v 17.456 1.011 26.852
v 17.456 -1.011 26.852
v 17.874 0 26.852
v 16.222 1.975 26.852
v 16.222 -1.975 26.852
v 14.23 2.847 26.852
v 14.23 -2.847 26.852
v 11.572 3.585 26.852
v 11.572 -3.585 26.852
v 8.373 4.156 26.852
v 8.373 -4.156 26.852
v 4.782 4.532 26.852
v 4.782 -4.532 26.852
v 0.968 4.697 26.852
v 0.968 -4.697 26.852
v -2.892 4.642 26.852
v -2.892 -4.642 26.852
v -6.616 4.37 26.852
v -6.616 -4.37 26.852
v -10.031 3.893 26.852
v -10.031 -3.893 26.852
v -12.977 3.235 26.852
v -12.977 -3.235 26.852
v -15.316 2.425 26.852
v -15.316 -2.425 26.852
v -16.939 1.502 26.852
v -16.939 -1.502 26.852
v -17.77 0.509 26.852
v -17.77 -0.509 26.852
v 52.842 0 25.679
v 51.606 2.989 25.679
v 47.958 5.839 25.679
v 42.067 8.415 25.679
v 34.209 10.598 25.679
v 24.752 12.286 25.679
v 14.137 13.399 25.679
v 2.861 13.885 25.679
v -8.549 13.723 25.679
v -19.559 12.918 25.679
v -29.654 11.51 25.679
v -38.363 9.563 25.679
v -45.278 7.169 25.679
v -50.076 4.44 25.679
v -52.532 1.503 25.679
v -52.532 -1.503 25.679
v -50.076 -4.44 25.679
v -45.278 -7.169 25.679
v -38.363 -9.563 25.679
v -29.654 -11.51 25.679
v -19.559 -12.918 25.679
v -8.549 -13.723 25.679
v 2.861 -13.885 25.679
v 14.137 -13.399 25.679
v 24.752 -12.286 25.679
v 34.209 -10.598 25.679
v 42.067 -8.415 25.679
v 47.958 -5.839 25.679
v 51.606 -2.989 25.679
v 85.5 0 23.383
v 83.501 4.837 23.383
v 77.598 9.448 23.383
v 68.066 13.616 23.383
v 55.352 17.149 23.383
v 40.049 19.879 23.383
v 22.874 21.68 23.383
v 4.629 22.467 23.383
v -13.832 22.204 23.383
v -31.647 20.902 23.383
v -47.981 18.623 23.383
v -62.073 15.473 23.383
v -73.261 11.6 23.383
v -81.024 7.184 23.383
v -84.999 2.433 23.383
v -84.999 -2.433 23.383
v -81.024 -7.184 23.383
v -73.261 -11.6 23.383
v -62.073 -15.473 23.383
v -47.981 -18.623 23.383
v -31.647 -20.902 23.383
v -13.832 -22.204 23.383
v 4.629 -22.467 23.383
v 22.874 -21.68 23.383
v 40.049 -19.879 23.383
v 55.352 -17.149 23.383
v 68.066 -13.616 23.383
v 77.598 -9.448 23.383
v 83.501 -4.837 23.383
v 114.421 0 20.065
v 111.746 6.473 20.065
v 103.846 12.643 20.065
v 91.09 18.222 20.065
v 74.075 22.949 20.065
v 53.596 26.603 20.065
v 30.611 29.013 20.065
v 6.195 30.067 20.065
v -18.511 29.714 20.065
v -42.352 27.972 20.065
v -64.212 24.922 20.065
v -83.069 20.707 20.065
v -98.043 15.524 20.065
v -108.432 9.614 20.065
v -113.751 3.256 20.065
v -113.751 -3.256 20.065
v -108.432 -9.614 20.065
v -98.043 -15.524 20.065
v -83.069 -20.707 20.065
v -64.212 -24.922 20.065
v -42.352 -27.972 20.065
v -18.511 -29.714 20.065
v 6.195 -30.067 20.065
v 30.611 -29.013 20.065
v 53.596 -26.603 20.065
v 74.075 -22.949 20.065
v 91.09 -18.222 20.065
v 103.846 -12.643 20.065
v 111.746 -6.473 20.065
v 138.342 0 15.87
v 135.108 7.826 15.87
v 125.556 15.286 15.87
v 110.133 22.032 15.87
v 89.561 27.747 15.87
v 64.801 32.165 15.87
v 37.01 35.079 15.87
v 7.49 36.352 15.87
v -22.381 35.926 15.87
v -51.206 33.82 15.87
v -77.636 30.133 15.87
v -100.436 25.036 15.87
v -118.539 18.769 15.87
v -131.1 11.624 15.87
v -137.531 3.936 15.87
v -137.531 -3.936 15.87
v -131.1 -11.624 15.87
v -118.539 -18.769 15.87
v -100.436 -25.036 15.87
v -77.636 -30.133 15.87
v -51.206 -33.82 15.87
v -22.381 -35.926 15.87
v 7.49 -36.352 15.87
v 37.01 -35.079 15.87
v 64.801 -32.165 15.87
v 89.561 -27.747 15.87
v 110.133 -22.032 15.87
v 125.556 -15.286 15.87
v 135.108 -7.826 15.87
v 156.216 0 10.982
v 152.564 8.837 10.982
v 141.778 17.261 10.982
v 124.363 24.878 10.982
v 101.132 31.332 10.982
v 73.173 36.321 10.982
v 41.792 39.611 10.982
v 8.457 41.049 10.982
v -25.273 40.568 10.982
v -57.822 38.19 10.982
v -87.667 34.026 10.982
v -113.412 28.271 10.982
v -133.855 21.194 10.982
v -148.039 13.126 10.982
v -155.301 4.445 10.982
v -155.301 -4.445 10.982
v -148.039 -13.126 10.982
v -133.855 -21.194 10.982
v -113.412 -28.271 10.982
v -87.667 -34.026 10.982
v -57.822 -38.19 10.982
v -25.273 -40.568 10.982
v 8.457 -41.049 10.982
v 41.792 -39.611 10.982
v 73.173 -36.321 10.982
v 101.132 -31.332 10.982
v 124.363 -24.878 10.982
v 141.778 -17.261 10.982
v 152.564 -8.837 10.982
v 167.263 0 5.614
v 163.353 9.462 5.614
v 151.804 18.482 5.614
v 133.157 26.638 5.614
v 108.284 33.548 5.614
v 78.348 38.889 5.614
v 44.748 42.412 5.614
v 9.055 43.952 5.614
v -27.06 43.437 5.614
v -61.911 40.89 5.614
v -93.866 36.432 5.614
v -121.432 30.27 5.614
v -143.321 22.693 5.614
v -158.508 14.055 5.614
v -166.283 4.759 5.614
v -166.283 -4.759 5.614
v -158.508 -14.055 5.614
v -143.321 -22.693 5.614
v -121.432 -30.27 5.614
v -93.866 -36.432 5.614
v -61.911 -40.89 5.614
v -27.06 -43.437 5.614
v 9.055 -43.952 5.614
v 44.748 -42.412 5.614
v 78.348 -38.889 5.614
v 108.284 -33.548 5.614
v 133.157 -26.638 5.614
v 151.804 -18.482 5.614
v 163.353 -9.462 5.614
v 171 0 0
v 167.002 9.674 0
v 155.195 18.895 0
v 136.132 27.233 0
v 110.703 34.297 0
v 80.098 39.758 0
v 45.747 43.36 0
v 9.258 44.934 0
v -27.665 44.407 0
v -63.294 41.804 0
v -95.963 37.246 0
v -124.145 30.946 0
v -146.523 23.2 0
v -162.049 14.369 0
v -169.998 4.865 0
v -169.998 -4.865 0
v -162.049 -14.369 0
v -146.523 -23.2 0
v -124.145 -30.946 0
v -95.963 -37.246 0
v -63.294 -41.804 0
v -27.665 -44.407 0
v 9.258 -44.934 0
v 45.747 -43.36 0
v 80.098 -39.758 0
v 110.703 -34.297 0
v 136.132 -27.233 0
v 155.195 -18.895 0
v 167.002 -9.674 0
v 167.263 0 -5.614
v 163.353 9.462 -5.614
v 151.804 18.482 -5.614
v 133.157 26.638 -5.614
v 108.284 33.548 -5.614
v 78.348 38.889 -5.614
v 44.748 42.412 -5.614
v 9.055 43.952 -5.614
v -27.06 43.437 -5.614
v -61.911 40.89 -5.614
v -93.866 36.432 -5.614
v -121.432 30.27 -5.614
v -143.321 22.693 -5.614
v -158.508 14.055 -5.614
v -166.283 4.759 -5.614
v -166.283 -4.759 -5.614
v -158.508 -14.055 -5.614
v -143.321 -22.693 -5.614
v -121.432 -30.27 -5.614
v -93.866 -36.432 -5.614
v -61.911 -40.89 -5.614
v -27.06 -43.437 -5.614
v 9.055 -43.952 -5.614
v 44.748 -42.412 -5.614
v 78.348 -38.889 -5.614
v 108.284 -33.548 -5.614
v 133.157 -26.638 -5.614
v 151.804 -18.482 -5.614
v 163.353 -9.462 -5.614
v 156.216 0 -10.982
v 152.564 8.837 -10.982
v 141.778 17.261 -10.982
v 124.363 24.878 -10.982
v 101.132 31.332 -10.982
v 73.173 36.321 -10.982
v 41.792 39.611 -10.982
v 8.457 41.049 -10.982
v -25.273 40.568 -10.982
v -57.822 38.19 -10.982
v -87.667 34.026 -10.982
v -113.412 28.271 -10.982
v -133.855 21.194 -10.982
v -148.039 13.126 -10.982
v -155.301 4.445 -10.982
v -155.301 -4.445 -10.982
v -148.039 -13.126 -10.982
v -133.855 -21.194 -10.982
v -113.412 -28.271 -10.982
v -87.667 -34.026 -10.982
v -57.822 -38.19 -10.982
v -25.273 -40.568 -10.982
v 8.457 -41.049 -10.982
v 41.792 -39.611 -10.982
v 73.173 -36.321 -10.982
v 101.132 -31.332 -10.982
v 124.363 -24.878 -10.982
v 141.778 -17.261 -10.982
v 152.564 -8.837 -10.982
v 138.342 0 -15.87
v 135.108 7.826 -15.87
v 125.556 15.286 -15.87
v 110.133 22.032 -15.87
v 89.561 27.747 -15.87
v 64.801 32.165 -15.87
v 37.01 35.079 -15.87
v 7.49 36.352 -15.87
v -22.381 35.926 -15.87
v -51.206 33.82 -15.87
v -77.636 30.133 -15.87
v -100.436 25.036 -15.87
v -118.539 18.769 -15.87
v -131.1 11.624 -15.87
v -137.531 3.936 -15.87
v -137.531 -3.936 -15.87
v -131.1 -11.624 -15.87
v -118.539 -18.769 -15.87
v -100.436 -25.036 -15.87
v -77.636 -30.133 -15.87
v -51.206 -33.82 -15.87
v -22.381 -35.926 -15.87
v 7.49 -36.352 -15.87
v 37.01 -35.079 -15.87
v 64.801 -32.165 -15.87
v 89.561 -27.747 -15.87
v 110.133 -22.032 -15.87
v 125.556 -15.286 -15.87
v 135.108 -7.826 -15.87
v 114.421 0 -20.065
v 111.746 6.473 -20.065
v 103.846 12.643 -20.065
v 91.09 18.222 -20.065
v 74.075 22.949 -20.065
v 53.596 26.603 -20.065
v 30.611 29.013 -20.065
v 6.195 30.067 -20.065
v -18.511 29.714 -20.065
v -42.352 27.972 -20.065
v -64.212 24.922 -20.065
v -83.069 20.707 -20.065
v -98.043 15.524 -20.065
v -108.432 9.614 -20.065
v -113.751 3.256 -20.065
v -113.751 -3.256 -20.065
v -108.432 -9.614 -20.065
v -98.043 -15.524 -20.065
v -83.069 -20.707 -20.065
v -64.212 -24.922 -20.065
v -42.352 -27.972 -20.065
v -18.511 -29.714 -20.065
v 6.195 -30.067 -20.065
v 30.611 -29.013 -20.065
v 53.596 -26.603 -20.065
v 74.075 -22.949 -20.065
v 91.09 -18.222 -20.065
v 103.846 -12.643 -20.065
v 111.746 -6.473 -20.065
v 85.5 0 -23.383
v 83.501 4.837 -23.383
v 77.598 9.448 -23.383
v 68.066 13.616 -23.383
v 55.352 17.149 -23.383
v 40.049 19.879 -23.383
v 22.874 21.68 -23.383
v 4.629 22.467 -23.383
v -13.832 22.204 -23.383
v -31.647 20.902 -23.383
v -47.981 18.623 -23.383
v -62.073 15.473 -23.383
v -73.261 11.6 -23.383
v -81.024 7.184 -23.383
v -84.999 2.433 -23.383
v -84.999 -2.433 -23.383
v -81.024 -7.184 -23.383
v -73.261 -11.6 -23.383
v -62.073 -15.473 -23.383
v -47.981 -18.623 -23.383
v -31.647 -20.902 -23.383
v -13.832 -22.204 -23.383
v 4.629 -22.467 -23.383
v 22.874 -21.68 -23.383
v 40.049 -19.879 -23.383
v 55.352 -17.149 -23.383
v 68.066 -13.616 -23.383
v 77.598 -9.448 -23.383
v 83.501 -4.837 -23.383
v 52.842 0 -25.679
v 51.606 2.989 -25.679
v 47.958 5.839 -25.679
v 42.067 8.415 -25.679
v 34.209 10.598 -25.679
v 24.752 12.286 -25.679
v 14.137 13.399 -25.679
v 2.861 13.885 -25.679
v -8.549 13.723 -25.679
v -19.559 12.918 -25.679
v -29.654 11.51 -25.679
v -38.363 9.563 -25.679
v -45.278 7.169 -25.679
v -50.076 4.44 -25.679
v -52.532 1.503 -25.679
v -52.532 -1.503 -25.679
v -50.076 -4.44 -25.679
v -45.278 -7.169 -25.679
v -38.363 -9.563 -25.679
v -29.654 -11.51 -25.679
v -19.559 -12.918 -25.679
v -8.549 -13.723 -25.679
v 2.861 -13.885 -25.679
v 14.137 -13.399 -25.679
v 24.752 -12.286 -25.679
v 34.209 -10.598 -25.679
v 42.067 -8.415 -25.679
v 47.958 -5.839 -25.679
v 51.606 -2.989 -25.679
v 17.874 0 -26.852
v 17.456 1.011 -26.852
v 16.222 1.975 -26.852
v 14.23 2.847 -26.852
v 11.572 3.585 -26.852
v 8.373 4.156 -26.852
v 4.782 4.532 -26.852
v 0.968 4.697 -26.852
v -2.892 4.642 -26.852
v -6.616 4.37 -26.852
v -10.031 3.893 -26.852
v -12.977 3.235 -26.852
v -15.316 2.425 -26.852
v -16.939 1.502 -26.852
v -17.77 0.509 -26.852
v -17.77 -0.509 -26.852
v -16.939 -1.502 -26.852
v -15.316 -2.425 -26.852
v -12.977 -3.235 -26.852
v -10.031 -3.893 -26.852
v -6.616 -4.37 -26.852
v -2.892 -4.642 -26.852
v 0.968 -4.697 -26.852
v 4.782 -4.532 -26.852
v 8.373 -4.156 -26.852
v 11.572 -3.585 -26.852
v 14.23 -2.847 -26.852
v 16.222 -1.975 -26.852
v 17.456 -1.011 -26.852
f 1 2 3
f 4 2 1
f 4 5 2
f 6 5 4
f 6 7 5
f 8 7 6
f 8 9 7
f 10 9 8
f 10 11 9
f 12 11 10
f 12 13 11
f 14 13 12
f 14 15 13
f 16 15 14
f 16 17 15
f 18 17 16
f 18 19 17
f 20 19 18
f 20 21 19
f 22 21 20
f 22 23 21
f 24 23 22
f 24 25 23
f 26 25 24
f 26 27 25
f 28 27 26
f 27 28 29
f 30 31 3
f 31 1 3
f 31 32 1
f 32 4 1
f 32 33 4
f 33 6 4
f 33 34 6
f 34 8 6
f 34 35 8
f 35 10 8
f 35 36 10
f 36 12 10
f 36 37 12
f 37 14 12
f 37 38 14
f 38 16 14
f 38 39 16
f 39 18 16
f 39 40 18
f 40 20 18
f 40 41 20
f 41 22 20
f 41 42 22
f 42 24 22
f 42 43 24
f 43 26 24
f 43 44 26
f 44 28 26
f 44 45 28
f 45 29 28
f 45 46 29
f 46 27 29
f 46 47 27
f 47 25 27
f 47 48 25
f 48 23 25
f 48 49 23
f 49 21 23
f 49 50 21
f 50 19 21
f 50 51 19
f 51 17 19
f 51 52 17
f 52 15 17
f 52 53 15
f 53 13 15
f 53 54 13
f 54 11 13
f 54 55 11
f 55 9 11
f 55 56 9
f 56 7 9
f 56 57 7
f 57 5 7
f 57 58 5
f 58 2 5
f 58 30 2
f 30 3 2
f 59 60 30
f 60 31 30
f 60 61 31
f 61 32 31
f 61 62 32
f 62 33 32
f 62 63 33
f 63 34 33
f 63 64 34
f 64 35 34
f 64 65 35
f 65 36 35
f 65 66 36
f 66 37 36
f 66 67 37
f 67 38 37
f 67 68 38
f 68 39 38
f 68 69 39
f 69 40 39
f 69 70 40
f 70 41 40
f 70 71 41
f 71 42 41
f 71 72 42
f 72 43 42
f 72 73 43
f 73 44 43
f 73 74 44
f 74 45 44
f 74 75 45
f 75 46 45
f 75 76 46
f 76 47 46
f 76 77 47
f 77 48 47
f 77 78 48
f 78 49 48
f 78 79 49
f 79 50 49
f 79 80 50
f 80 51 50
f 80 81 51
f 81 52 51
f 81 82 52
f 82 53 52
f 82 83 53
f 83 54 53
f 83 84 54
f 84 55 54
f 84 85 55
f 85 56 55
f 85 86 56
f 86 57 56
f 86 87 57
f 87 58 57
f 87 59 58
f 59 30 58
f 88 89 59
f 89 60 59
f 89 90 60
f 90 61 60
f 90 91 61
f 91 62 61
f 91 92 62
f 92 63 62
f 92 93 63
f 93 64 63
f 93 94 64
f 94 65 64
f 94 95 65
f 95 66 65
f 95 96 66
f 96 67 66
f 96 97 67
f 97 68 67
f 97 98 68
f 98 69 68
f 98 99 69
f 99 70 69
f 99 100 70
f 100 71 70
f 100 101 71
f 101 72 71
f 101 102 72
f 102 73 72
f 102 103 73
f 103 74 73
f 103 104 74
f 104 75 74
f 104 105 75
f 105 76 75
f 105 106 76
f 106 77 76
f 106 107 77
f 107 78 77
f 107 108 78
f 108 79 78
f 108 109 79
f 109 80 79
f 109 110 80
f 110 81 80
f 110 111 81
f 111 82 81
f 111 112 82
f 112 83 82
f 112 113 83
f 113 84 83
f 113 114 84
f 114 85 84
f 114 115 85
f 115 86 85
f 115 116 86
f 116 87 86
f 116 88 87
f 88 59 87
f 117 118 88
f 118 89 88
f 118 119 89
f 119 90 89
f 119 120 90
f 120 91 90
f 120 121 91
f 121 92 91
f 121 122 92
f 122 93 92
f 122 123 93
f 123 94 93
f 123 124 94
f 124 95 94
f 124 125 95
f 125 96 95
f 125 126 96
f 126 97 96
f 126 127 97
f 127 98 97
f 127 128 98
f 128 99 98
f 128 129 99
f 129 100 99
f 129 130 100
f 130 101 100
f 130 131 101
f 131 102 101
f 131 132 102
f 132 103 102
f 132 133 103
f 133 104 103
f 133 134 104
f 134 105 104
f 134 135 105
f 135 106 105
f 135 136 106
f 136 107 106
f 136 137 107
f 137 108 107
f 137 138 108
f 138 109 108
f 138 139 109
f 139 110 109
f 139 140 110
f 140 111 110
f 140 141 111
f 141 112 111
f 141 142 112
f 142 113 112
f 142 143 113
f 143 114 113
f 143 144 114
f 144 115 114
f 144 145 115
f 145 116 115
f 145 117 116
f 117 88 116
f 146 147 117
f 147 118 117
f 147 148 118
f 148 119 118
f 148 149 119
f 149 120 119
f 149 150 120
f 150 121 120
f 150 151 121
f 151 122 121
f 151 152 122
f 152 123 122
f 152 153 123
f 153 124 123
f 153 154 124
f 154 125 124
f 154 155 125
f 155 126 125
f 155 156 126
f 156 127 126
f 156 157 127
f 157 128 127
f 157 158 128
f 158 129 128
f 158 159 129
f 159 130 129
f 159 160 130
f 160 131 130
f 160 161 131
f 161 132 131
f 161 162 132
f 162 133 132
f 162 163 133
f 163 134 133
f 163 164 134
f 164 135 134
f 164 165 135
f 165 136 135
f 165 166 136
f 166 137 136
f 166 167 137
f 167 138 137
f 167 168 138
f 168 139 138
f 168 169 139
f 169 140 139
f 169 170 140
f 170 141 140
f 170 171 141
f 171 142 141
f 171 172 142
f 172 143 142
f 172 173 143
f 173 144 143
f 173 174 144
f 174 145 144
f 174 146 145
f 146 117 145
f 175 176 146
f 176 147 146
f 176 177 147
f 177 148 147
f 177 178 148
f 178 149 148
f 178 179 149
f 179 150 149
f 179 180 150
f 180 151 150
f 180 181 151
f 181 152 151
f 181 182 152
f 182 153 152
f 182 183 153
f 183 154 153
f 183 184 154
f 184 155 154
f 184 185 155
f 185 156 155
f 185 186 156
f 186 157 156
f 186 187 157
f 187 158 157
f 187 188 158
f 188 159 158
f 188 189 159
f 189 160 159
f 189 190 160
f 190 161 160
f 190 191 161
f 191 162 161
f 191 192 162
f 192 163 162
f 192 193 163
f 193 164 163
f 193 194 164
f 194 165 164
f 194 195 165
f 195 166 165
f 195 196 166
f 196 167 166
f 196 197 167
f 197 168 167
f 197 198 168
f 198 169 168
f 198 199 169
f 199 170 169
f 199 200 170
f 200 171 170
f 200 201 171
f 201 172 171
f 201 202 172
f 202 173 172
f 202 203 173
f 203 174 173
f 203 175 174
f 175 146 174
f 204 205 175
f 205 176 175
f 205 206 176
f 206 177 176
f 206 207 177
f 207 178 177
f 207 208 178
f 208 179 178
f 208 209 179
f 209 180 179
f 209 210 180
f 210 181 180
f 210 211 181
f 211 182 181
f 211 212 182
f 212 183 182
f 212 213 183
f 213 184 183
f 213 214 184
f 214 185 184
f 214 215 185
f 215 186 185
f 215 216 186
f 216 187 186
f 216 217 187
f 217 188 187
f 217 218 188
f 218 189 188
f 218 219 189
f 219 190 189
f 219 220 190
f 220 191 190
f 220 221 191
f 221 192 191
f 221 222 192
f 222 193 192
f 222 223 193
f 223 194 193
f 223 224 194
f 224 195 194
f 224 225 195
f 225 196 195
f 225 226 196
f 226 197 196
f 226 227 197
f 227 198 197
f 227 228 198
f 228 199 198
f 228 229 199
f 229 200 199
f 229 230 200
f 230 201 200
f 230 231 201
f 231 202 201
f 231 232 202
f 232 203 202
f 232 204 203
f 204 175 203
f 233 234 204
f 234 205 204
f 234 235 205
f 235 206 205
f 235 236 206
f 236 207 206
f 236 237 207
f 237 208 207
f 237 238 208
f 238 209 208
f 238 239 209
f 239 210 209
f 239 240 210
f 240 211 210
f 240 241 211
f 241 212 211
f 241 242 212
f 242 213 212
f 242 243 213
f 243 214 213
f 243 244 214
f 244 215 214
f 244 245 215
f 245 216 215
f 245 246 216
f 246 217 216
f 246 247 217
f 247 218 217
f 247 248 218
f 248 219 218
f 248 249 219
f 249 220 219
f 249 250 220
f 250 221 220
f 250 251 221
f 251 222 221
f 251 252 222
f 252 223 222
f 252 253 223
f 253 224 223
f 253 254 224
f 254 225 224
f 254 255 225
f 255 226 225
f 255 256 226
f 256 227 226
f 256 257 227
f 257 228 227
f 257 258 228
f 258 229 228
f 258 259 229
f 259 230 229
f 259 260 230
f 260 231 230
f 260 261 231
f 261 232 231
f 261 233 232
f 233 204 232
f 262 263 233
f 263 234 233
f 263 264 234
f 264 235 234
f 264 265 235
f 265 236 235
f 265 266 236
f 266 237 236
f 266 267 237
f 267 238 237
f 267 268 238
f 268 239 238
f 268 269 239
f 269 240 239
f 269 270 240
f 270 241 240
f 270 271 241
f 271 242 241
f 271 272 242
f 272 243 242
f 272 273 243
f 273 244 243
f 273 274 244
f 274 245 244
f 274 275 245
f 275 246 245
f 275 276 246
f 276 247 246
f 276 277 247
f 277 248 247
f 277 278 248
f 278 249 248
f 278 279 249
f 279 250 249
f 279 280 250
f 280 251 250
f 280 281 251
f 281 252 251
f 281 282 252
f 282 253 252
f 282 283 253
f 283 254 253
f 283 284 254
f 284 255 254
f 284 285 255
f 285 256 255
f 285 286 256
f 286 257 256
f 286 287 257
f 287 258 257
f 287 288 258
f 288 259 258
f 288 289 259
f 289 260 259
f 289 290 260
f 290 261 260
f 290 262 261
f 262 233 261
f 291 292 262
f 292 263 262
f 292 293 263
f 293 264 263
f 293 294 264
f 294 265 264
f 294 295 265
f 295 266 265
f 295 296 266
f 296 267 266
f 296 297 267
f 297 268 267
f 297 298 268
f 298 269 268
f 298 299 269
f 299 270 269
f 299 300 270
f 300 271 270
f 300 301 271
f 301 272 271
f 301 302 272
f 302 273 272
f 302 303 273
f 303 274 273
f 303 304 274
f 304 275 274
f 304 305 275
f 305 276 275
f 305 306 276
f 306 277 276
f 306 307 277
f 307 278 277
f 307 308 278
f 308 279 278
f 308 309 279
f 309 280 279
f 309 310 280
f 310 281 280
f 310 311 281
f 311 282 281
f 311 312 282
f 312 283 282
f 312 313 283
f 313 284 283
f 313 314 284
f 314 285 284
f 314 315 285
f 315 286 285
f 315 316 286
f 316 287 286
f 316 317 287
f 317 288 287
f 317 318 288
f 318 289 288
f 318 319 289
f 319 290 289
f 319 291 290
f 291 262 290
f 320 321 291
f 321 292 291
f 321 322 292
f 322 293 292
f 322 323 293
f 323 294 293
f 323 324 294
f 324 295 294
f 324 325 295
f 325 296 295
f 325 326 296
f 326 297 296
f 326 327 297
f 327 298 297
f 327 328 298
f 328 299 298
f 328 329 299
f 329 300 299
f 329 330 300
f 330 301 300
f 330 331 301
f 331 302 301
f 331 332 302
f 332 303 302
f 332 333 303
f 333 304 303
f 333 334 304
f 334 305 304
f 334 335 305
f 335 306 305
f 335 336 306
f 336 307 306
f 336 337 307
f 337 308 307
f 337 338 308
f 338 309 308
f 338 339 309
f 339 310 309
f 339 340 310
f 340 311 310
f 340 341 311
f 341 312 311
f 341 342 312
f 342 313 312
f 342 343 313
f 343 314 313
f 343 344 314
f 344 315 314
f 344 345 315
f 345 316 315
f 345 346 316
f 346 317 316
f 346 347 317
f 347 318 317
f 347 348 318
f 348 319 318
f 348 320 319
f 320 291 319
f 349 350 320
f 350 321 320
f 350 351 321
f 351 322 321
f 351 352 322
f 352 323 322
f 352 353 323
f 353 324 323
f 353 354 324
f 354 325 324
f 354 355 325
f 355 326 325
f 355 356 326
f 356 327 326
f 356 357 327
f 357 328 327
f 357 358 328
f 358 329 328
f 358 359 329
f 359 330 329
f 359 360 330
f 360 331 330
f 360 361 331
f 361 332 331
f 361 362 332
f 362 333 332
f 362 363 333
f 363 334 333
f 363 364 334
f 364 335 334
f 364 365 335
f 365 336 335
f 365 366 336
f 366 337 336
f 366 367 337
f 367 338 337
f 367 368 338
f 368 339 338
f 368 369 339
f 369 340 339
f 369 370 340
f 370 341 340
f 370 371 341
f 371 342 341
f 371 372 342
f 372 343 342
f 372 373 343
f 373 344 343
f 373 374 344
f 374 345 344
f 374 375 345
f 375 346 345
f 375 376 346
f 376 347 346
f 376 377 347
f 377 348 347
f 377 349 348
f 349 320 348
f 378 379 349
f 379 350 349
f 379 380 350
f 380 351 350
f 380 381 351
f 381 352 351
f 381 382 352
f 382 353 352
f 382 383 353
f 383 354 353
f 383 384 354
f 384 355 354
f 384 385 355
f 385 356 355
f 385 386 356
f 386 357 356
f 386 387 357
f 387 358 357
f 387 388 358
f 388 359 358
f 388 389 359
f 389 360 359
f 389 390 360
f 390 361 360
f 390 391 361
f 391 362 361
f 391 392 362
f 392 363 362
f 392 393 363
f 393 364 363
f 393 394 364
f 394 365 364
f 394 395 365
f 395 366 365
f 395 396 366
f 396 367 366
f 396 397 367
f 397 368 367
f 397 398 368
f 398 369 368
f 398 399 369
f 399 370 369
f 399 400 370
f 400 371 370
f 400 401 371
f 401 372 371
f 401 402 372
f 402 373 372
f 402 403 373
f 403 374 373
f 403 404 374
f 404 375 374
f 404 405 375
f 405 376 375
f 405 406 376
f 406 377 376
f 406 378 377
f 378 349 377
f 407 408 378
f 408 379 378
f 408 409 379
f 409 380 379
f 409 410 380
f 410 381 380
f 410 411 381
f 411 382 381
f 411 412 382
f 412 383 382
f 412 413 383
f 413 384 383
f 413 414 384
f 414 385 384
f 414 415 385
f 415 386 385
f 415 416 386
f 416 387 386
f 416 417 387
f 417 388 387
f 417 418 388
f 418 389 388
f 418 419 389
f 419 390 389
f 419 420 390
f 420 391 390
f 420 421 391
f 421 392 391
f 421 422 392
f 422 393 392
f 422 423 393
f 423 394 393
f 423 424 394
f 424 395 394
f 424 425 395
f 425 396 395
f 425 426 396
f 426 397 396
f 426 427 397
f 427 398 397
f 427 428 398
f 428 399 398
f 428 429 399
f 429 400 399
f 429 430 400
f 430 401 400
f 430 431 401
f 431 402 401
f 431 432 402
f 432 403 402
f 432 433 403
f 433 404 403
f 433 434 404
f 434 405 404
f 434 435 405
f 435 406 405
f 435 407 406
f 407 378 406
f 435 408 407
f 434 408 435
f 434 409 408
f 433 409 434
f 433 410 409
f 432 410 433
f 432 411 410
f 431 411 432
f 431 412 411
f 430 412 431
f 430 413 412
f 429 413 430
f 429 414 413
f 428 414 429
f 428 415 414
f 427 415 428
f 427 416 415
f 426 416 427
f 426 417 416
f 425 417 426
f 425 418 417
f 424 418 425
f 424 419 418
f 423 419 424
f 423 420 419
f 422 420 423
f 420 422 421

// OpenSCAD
// Generated by SolidPython 1.0.1 on 2020-07-29 00:46:53


scale(v = [19, 5, 3]) {
	sphere(r = 9);
}
/***********************************************
*********      SolidPython code:      **********
************************************************
 
# import packages: SolidPython
from solid import *
from solid.utils import *
from itertools import chain, combinations, permutations


class Resize:

    def __init__(self, scad_file):
        self.scad_file = scad_file
        #self.scad_file = import_scad(scad_file)
        # cone/cylinder param:
        self.r1 = 0
        self.r2 = 0
        self.h = 0
        # rectangular prism param:
        self.w = 0
        self.l = 0
        # ellipse param:
        self.r = 0

    # import OpenScad code (file name corresponds to shape)


    # classify shape + parameters
    def assign(self, param1, param2, param3):
        if self.scad_file == 'cone.scad':
            self.r1 = param1
            self.r2 = param2
            self.h = param3
        elif self.scad_file == 'cylinder.scad':
            self.r1 = param1
            self.r2 = param2
            self.h = param3
        elif self.scad_file == 'rectangularPrism.scad':
            self.h = param1
            self.l = param2
            self.w = param3
        else:
            self.r = param1
            self.h = param2

    # resize parameters
    def iterate(self):
        x = range(3, 20, 2)
        i = 1
        if self.scad_file == 'cone.scad':
            tempList = list(permutations(x, 2))
            for temp in tempList:
                param1 = temp[0]
                param2 = temp[1]
                filepath = 'produced_scad_files/' + 'cone' + str(param1) + '_' + str(param2) + '_' + '.scad'
                scad_render_to_file(cylinder(h=param1, r1=param2, r2=0), filepath)

        elif self.scad_file == 'cylinder.scad':
            tempList = list(permutations(x, 3))
            for temp in tempList:
                param1 = temp[0]
                param2 = temp[1]
                filepath = 'produced_scad_files/' + 'cylinder' + str(param1) + '_' + str(param2) + '_' + '.scad'
                scad_render_to_file(cylinder(h=param1, r1=param2, r2=param2), filepath)

        elif self.scad_file == 'rectangularPrism.scad':
            tempList = list(permutations(x, 3))
            for temp in tempList:
                param1 = temp[0]
                param2 = temp[1]
                param3 = temp[2]
                filepath = 'produced_scad_files/' + 'rectangularPrism' + str(param1) + '_' + str(param2) + '_' + str(
                    param3) + '.scad'
                scad_render_to_file(cube(size=(param1, param2, param3)), filepath)

        elif self.scad_file == 'ellipse.scad':
            tempList = list(permutations(x, 4))
            for temp in tempList:
                param1 = temp[0]
                param2 = temp[1]
                param3 = temp[2]
                param4 = temp[3]
                filepath = 'produced_scad_files/' + 'ellipse' + str(param1) + '_' + str(param2) + '_' + str(param3) + '_' + str(param4) + '.scad'
                scad_render_to_file(scale([param1, param2, param3])(sphere(r=param4)), filepath)

    def render_to_scadfile(self):
        scad_render_to_file(scad, 'example.scad') 
 
************************************************/
